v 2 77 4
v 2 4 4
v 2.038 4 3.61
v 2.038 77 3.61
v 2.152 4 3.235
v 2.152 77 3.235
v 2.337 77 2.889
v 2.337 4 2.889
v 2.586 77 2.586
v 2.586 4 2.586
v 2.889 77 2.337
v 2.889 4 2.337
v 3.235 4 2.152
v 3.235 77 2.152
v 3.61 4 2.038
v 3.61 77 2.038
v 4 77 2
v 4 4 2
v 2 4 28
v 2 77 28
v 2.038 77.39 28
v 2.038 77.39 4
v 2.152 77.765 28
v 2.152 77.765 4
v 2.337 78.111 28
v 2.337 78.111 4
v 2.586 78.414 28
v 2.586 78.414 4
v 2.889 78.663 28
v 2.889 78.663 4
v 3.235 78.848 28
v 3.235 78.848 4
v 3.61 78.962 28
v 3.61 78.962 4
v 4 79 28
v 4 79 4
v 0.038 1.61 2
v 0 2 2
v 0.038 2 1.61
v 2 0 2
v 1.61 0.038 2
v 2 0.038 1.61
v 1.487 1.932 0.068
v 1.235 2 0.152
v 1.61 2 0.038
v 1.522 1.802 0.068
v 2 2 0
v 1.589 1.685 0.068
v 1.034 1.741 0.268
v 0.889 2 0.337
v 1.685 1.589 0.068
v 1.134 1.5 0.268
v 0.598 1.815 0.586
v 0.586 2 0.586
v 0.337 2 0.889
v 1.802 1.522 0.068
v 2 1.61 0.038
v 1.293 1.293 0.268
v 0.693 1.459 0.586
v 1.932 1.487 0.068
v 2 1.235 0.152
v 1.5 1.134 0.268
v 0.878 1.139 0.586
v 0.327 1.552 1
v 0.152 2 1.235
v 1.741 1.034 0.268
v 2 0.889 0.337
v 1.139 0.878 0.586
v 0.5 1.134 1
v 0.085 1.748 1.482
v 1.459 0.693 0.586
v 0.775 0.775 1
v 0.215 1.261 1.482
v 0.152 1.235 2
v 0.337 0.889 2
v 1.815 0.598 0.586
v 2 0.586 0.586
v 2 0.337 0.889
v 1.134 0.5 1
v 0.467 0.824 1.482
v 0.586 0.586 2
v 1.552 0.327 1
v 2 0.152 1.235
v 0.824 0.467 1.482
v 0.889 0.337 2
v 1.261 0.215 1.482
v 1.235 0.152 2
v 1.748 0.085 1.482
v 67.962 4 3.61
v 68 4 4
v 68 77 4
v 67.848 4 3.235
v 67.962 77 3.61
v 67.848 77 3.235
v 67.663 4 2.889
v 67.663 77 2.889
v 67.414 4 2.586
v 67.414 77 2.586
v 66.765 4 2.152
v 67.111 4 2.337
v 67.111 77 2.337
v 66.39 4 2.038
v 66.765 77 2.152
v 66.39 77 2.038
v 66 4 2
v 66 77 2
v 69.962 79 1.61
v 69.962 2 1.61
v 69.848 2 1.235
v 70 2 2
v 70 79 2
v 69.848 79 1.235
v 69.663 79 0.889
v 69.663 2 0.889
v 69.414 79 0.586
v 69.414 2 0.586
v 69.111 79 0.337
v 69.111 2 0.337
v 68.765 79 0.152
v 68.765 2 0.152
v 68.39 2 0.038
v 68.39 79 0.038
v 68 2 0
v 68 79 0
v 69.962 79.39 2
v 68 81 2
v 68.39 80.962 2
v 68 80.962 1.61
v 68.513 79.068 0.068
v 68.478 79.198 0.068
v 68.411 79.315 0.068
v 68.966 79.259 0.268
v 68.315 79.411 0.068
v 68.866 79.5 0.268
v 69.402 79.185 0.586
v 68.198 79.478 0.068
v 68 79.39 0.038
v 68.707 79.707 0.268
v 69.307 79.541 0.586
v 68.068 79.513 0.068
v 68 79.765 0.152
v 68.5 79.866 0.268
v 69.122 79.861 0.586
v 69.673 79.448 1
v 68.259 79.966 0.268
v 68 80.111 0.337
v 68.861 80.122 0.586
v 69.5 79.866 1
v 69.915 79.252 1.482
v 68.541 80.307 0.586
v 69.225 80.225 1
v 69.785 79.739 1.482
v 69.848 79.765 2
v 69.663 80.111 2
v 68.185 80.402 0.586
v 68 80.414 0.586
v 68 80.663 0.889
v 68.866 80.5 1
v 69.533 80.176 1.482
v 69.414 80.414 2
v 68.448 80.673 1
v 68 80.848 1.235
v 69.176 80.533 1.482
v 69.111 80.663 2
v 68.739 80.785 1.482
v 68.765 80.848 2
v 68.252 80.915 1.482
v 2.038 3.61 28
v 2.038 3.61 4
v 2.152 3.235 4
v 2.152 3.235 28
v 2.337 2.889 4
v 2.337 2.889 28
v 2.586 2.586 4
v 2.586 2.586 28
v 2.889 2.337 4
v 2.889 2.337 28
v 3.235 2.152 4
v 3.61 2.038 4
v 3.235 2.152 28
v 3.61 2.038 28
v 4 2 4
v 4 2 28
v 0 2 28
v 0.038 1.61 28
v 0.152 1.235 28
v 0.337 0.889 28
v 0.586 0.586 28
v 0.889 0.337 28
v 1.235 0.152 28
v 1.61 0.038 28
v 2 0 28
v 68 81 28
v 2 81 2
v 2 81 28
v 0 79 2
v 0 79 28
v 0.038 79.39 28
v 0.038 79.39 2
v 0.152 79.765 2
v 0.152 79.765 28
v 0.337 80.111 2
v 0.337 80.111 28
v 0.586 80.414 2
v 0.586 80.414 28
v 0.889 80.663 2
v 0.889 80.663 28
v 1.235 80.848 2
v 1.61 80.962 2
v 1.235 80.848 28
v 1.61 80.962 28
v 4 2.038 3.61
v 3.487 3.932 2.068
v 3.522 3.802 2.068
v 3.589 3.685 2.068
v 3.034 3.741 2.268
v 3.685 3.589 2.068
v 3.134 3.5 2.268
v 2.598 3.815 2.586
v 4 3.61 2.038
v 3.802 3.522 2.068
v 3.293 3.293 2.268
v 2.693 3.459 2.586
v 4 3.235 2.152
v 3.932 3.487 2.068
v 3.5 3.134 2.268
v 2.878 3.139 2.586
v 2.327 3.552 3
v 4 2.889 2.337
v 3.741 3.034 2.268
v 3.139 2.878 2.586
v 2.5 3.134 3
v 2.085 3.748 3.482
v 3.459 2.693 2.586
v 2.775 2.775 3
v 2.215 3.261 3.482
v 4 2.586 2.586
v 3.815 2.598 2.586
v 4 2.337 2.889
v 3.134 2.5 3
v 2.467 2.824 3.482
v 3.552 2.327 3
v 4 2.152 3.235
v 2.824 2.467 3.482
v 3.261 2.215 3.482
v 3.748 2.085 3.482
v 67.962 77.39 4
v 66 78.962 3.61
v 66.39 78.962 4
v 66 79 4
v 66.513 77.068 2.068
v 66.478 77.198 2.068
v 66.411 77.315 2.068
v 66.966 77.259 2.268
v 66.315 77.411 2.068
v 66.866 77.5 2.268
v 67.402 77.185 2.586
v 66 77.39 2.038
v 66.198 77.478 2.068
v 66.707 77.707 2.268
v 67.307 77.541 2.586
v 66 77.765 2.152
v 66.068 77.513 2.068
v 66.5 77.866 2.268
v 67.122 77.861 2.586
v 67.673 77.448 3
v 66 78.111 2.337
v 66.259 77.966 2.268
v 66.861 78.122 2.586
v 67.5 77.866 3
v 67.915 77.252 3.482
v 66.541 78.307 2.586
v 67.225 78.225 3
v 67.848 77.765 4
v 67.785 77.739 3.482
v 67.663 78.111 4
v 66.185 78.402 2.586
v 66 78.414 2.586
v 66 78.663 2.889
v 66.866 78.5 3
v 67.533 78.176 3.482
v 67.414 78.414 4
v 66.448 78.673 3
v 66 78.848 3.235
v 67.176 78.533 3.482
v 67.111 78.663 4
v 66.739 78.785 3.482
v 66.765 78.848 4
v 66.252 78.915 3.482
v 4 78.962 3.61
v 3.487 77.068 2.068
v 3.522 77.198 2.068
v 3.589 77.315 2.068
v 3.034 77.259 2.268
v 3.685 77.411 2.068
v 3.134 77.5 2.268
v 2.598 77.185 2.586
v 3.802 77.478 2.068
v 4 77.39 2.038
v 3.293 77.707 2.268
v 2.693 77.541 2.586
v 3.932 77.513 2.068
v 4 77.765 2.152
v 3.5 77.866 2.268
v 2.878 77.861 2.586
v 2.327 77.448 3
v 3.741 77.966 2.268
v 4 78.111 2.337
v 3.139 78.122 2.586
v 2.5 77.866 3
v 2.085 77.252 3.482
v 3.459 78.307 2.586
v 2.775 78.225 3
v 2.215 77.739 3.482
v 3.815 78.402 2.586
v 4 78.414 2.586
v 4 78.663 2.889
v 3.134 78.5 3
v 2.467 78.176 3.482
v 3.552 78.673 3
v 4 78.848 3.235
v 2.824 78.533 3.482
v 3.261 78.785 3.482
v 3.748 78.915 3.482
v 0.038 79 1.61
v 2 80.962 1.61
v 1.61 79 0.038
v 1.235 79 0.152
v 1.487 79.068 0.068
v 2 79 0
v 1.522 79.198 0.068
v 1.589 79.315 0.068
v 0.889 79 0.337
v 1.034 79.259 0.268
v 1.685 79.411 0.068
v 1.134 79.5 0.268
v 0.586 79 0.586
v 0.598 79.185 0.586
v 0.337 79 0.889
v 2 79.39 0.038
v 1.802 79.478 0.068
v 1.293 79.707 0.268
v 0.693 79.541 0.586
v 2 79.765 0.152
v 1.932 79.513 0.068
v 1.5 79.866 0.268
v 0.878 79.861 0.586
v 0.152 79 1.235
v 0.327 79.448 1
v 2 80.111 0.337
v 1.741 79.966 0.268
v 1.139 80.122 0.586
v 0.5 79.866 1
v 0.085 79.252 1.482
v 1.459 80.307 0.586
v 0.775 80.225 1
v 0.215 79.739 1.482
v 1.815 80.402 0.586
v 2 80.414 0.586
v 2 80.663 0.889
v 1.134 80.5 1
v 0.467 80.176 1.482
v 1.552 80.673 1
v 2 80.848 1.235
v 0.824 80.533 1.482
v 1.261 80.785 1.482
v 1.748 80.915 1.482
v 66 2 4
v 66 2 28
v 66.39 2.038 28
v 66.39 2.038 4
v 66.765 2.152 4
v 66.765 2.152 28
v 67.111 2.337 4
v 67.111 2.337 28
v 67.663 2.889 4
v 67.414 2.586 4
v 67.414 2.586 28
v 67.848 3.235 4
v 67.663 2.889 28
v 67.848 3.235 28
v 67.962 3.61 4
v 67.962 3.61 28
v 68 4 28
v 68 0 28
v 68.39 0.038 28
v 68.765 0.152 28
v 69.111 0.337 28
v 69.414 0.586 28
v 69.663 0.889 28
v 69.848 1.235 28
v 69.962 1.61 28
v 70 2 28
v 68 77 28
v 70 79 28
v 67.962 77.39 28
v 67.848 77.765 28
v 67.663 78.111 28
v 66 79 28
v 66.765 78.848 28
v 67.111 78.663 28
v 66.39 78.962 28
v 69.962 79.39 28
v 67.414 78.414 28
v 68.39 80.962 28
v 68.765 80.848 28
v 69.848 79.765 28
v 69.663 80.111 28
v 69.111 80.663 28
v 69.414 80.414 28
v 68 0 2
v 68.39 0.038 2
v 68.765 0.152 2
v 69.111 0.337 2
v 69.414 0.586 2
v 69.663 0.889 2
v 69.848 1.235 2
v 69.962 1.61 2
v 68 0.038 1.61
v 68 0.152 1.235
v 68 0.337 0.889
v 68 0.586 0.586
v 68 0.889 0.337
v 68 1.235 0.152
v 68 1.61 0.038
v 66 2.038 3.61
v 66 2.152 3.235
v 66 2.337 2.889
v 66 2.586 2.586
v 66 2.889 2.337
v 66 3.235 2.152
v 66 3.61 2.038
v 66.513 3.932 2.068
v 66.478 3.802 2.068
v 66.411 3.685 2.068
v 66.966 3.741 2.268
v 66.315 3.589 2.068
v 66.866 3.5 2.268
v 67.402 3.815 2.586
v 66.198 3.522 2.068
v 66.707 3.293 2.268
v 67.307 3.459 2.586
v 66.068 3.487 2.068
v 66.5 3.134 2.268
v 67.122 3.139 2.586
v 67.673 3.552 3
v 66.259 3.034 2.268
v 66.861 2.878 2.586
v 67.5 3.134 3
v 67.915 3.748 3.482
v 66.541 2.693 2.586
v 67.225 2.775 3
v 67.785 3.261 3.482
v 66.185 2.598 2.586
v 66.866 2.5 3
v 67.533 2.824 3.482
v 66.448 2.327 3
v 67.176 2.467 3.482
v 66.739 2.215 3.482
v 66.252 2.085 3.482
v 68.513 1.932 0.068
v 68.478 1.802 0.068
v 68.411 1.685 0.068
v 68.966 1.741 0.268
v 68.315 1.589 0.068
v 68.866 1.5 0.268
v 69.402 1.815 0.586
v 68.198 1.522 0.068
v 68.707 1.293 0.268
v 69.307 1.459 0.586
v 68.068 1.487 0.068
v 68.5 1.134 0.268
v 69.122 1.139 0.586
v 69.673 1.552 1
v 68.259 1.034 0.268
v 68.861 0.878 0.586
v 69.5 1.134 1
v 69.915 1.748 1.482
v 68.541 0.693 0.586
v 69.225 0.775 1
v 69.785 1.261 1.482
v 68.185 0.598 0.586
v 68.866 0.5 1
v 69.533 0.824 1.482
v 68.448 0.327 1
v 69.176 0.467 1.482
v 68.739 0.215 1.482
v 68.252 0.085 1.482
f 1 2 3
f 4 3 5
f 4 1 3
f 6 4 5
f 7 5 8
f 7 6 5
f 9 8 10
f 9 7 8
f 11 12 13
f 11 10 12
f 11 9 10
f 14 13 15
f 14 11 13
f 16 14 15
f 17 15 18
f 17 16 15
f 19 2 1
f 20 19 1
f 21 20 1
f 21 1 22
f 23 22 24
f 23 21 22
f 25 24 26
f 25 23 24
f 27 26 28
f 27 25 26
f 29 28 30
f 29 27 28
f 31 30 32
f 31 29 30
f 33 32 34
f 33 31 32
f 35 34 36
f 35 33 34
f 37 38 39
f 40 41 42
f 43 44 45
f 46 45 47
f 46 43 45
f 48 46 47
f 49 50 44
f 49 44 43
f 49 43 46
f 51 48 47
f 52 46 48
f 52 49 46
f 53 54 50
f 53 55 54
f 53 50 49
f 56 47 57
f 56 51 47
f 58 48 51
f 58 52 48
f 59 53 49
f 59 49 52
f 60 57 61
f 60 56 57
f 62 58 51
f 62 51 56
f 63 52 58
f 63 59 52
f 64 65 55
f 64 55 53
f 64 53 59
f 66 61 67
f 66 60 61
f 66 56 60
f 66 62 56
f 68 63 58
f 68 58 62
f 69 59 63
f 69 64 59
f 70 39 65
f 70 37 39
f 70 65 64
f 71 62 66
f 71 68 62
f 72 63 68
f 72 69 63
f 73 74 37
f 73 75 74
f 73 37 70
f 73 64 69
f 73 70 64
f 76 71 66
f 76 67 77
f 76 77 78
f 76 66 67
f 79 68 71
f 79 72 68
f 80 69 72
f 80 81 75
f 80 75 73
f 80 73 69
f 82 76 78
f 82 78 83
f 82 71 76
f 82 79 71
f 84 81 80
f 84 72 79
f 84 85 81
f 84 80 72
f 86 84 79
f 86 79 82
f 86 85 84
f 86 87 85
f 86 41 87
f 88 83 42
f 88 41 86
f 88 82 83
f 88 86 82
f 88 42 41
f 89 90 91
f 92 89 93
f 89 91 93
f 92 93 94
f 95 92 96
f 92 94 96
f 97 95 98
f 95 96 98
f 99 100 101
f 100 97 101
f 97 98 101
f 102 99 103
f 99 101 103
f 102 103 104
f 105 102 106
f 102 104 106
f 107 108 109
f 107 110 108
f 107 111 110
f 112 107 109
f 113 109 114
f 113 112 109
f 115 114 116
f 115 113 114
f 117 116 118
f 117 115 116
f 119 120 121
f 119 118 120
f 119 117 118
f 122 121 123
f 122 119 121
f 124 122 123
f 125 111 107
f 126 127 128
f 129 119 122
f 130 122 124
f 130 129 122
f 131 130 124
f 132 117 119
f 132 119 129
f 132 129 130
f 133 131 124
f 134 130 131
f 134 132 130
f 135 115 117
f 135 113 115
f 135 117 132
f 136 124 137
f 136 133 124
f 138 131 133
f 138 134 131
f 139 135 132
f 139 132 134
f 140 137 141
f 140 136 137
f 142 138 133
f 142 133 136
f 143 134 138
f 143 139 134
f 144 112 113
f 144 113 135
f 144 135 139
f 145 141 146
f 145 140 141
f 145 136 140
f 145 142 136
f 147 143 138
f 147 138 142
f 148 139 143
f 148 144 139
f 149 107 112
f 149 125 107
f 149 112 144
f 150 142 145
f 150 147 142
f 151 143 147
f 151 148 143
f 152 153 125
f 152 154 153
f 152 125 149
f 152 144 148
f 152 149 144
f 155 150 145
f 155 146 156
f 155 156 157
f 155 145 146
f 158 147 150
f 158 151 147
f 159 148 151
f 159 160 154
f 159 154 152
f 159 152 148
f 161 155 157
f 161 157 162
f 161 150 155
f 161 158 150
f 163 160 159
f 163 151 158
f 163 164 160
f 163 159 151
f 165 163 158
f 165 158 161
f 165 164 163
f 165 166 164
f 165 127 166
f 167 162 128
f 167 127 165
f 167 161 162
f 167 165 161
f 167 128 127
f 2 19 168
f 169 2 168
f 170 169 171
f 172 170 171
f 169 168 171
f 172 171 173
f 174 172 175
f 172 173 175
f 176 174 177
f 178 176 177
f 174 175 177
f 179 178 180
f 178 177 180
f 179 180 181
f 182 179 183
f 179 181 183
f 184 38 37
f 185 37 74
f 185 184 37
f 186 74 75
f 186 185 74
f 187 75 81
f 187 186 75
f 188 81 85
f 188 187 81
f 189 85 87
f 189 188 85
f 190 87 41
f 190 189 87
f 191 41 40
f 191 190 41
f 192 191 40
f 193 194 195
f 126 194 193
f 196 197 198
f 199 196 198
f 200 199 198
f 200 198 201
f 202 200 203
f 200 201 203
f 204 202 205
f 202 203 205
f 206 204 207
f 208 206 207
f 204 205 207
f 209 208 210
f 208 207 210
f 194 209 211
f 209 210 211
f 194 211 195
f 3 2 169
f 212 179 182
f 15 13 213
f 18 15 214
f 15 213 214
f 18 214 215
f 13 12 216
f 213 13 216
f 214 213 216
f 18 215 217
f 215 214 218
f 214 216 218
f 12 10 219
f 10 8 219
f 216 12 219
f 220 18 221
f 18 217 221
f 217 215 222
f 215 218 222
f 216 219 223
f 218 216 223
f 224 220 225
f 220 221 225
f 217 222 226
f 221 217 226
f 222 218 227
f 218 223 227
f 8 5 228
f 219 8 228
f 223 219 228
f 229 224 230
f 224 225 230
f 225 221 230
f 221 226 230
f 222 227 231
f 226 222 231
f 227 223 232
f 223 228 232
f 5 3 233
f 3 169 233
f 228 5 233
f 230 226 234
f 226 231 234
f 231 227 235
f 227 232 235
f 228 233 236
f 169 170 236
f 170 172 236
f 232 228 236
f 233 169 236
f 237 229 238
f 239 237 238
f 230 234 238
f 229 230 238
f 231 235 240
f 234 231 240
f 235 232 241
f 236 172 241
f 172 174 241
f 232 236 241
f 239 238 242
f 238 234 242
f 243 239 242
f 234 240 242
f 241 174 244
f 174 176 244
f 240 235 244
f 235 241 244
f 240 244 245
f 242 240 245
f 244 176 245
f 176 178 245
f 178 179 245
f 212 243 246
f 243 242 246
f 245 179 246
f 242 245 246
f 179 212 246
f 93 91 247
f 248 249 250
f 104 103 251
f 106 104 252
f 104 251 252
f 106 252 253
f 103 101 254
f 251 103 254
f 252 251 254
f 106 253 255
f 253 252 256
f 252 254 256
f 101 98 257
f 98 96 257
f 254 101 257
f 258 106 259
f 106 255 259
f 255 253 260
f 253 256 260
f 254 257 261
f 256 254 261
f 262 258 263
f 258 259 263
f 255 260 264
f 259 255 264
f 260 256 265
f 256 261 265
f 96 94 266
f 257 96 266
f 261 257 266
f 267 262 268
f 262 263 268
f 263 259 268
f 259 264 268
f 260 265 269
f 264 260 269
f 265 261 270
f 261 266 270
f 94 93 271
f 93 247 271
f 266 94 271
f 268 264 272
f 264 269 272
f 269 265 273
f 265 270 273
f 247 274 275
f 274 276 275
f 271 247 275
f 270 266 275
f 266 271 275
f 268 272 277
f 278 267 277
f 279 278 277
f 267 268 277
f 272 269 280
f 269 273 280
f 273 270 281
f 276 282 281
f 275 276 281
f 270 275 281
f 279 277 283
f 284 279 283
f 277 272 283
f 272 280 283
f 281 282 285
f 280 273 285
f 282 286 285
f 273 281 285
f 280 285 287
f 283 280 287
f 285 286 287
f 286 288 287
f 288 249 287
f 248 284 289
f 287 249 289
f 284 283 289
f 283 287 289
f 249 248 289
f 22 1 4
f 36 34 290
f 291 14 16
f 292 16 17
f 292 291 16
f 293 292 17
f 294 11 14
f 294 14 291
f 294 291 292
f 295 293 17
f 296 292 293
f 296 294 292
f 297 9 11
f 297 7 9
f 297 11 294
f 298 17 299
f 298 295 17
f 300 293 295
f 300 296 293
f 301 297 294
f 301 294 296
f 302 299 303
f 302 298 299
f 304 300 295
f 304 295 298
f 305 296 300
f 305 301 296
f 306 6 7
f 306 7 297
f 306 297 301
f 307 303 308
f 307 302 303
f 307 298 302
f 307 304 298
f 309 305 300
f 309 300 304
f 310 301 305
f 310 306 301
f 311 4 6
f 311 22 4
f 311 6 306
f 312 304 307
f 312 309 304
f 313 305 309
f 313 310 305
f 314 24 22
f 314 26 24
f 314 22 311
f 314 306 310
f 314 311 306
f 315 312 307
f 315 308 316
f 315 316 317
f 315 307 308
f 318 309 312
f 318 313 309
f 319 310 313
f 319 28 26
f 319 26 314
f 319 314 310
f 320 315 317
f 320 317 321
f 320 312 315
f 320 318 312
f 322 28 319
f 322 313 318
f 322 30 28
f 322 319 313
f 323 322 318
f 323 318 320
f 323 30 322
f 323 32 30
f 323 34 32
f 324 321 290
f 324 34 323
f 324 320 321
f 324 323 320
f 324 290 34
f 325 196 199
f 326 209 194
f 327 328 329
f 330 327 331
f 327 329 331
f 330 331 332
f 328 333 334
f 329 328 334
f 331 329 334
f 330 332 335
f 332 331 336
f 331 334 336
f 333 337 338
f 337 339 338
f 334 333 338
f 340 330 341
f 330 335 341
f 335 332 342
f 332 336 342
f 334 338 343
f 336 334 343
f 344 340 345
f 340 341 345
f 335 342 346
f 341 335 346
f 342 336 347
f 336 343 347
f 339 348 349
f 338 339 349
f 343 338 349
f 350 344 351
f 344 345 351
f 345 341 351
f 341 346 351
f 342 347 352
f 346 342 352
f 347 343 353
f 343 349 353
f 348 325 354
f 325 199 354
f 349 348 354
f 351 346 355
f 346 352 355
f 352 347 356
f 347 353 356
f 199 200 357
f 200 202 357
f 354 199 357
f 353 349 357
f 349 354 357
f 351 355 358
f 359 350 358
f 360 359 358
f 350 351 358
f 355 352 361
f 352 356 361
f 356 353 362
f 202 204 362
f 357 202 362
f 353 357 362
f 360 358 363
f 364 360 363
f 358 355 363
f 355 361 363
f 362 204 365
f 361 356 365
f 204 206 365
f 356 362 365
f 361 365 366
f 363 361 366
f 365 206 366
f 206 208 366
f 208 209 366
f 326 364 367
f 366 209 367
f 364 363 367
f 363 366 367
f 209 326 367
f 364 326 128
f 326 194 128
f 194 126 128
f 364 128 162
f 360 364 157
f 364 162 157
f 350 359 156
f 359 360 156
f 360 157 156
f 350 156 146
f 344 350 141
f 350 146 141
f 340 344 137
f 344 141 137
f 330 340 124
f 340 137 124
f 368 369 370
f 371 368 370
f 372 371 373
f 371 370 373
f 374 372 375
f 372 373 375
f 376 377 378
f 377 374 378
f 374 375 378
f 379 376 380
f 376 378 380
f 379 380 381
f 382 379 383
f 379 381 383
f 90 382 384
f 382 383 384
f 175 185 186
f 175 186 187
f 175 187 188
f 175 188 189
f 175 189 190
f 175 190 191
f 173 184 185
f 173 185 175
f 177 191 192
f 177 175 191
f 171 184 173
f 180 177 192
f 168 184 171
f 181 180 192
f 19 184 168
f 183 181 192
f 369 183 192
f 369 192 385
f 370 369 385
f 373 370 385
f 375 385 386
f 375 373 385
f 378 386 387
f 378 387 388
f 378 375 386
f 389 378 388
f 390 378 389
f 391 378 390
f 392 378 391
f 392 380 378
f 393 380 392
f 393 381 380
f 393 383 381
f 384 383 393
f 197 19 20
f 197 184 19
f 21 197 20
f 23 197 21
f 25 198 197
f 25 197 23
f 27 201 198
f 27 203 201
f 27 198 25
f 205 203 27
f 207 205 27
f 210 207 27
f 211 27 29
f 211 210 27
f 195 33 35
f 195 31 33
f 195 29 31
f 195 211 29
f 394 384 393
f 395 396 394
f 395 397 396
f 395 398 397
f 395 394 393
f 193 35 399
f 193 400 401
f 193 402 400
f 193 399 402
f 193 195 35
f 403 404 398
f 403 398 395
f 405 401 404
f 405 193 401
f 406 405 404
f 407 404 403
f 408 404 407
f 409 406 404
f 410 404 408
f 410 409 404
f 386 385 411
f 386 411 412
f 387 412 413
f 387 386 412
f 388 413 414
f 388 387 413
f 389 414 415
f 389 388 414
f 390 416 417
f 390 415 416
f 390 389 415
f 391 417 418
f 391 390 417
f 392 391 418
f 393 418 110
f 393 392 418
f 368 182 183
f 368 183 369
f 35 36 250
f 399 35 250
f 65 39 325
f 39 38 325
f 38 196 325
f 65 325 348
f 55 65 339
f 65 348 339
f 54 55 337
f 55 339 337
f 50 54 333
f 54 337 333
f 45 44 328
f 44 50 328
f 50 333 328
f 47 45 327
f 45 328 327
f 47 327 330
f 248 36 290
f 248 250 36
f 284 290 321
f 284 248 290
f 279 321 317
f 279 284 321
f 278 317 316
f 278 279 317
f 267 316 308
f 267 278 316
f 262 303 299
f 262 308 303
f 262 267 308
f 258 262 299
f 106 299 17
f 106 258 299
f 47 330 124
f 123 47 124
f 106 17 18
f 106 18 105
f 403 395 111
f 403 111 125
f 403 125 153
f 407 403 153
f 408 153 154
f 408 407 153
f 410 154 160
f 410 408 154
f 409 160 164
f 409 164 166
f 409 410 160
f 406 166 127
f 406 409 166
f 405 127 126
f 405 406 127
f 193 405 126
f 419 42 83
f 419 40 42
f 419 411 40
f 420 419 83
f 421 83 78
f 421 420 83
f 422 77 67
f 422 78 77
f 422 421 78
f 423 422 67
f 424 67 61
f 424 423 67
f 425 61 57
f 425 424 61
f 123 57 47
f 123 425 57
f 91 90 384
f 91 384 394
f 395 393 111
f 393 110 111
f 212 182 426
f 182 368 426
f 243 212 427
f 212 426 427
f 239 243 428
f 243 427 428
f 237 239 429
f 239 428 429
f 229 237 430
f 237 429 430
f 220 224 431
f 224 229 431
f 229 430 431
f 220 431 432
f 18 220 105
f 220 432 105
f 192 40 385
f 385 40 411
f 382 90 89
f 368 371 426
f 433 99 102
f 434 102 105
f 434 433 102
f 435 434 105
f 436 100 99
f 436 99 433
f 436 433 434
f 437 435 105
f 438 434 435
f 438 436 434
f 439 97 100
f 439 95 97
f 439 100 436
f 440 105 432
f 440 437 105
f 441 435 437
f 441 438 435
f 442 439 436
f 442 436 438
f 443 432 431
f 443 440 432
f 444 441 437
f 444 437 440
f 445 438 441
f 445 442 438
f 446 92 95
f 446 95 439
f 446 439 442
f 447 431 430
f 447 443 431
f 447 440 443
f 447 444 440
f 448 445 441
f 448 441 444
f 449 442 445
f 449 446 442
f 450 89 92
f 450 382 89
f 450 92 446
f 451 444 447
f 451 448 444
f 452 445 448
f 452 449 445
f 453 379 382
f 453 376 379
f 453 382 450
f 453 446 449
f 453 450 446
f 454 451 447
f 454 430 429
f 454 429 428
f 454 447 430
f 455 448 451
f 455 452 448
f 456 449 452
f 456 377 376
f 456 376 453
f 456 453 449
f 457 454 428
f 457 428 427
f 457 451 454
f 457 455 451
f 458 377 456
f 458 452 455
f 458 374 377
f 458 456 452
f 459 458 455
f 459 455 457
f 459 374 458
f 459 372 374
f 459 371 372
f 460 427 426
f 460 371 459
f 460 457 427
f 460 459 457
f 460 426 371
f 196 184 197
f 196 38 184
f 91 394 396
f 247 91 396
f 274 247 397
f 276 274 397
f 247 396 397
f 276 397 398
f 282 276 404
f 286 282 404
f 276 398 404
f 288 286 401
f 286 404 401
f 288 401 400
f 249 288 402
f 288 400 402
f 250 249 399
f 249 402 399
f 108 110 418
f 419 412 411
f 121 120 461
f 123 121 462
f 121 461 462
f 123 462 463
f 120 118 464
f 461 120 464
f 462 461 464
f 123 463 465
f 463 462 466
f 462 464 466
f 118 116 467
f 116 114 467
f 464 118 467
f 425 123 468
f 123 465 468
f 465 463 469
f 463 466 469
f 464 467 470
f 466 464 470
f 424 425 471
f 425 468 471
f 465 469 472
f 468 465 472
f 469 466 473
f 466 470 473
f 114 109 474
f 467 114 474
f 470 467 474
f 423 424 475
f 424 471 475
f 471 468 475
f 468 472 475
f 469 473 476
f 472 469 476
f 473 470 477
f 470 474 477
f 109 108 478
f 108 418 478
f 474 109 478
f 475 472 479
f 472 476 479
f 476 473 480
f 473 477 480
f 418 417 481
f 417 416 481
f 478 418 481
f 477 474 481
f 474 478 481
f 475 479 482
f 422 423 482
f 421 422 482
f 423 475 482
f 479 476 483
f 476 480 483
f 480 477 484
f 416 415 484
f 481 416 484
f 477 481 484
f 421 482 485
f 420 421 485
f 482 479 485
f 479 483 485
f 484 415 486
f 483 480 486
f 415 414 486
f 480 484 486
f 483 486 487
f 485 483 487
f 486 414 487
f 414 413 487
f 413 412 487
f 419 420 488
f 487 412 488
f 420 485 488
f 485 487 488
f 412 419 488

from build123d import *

# Parameters (mm, degrees)
BOX003_W     = 66
BOX003_H     = 77
BOX003_DEPTH = 39
FILLET001_R  = 2
BOX002_W     = 70
BOX002_H     = 81
BOX002_DEPTH = 28
FILLET_R     = 2


with BuildPart() as bottomcut:
    # Box003 → Box003 (new body)
    with BuildSketch(Plane(origin=(2, 2, 2), x_dir=(1, 0, 0), z_dir=(0, 0, 1))):
        with Locations((33, 38.5)):
            Rectangle(BOX003_W, BOX003_H)
    extrude(amount=BOX003_DEPTH)

    # Fillet001
    fillet001_edges = [bottomcut.edges().sort_by_distance(p)[0] for p in [
        (2, 2, 21.5),
        (2, 79, 21.5),
        (2, 40.5, 2),
        (68, 2, 21.5),
        (68, 79, 21.5),
        (68, 40.5, 2),
        (35, 2, 2),
        (35, 79, 2),
    ]]
    fillet(fillet001_edges, radius=FILLET001_R)


with BuildPart() as bottom003:
    # Box002 → Box002 (new body)
    with BuildSketch(Plane.XY):
        with Locations((35, 40.5)):
            Rectangle(BOX002_W, BOX002_H)
    extrude(amount=BOX002_DEPTH)

    # Fillet
    fillet_edges = [bottom003.edges().sort_by_distance(p)[0] for p in [
        (0, 0, 14),
        (0, 81, 14),
        (0, 40.5, 0),
        (70, 0, 14),
        (70, 81, 14),
        (70, 40.5, 0),
        (35, 0, 0),
        (35, 81, 0),
    ]]
    fillet(fillet_edges, radius=FILLET_R)

    # Cut: cut bottomCut
    add(bottomcut.part, mode=Mode.SUBTRACT)


solid = bottom003.part
